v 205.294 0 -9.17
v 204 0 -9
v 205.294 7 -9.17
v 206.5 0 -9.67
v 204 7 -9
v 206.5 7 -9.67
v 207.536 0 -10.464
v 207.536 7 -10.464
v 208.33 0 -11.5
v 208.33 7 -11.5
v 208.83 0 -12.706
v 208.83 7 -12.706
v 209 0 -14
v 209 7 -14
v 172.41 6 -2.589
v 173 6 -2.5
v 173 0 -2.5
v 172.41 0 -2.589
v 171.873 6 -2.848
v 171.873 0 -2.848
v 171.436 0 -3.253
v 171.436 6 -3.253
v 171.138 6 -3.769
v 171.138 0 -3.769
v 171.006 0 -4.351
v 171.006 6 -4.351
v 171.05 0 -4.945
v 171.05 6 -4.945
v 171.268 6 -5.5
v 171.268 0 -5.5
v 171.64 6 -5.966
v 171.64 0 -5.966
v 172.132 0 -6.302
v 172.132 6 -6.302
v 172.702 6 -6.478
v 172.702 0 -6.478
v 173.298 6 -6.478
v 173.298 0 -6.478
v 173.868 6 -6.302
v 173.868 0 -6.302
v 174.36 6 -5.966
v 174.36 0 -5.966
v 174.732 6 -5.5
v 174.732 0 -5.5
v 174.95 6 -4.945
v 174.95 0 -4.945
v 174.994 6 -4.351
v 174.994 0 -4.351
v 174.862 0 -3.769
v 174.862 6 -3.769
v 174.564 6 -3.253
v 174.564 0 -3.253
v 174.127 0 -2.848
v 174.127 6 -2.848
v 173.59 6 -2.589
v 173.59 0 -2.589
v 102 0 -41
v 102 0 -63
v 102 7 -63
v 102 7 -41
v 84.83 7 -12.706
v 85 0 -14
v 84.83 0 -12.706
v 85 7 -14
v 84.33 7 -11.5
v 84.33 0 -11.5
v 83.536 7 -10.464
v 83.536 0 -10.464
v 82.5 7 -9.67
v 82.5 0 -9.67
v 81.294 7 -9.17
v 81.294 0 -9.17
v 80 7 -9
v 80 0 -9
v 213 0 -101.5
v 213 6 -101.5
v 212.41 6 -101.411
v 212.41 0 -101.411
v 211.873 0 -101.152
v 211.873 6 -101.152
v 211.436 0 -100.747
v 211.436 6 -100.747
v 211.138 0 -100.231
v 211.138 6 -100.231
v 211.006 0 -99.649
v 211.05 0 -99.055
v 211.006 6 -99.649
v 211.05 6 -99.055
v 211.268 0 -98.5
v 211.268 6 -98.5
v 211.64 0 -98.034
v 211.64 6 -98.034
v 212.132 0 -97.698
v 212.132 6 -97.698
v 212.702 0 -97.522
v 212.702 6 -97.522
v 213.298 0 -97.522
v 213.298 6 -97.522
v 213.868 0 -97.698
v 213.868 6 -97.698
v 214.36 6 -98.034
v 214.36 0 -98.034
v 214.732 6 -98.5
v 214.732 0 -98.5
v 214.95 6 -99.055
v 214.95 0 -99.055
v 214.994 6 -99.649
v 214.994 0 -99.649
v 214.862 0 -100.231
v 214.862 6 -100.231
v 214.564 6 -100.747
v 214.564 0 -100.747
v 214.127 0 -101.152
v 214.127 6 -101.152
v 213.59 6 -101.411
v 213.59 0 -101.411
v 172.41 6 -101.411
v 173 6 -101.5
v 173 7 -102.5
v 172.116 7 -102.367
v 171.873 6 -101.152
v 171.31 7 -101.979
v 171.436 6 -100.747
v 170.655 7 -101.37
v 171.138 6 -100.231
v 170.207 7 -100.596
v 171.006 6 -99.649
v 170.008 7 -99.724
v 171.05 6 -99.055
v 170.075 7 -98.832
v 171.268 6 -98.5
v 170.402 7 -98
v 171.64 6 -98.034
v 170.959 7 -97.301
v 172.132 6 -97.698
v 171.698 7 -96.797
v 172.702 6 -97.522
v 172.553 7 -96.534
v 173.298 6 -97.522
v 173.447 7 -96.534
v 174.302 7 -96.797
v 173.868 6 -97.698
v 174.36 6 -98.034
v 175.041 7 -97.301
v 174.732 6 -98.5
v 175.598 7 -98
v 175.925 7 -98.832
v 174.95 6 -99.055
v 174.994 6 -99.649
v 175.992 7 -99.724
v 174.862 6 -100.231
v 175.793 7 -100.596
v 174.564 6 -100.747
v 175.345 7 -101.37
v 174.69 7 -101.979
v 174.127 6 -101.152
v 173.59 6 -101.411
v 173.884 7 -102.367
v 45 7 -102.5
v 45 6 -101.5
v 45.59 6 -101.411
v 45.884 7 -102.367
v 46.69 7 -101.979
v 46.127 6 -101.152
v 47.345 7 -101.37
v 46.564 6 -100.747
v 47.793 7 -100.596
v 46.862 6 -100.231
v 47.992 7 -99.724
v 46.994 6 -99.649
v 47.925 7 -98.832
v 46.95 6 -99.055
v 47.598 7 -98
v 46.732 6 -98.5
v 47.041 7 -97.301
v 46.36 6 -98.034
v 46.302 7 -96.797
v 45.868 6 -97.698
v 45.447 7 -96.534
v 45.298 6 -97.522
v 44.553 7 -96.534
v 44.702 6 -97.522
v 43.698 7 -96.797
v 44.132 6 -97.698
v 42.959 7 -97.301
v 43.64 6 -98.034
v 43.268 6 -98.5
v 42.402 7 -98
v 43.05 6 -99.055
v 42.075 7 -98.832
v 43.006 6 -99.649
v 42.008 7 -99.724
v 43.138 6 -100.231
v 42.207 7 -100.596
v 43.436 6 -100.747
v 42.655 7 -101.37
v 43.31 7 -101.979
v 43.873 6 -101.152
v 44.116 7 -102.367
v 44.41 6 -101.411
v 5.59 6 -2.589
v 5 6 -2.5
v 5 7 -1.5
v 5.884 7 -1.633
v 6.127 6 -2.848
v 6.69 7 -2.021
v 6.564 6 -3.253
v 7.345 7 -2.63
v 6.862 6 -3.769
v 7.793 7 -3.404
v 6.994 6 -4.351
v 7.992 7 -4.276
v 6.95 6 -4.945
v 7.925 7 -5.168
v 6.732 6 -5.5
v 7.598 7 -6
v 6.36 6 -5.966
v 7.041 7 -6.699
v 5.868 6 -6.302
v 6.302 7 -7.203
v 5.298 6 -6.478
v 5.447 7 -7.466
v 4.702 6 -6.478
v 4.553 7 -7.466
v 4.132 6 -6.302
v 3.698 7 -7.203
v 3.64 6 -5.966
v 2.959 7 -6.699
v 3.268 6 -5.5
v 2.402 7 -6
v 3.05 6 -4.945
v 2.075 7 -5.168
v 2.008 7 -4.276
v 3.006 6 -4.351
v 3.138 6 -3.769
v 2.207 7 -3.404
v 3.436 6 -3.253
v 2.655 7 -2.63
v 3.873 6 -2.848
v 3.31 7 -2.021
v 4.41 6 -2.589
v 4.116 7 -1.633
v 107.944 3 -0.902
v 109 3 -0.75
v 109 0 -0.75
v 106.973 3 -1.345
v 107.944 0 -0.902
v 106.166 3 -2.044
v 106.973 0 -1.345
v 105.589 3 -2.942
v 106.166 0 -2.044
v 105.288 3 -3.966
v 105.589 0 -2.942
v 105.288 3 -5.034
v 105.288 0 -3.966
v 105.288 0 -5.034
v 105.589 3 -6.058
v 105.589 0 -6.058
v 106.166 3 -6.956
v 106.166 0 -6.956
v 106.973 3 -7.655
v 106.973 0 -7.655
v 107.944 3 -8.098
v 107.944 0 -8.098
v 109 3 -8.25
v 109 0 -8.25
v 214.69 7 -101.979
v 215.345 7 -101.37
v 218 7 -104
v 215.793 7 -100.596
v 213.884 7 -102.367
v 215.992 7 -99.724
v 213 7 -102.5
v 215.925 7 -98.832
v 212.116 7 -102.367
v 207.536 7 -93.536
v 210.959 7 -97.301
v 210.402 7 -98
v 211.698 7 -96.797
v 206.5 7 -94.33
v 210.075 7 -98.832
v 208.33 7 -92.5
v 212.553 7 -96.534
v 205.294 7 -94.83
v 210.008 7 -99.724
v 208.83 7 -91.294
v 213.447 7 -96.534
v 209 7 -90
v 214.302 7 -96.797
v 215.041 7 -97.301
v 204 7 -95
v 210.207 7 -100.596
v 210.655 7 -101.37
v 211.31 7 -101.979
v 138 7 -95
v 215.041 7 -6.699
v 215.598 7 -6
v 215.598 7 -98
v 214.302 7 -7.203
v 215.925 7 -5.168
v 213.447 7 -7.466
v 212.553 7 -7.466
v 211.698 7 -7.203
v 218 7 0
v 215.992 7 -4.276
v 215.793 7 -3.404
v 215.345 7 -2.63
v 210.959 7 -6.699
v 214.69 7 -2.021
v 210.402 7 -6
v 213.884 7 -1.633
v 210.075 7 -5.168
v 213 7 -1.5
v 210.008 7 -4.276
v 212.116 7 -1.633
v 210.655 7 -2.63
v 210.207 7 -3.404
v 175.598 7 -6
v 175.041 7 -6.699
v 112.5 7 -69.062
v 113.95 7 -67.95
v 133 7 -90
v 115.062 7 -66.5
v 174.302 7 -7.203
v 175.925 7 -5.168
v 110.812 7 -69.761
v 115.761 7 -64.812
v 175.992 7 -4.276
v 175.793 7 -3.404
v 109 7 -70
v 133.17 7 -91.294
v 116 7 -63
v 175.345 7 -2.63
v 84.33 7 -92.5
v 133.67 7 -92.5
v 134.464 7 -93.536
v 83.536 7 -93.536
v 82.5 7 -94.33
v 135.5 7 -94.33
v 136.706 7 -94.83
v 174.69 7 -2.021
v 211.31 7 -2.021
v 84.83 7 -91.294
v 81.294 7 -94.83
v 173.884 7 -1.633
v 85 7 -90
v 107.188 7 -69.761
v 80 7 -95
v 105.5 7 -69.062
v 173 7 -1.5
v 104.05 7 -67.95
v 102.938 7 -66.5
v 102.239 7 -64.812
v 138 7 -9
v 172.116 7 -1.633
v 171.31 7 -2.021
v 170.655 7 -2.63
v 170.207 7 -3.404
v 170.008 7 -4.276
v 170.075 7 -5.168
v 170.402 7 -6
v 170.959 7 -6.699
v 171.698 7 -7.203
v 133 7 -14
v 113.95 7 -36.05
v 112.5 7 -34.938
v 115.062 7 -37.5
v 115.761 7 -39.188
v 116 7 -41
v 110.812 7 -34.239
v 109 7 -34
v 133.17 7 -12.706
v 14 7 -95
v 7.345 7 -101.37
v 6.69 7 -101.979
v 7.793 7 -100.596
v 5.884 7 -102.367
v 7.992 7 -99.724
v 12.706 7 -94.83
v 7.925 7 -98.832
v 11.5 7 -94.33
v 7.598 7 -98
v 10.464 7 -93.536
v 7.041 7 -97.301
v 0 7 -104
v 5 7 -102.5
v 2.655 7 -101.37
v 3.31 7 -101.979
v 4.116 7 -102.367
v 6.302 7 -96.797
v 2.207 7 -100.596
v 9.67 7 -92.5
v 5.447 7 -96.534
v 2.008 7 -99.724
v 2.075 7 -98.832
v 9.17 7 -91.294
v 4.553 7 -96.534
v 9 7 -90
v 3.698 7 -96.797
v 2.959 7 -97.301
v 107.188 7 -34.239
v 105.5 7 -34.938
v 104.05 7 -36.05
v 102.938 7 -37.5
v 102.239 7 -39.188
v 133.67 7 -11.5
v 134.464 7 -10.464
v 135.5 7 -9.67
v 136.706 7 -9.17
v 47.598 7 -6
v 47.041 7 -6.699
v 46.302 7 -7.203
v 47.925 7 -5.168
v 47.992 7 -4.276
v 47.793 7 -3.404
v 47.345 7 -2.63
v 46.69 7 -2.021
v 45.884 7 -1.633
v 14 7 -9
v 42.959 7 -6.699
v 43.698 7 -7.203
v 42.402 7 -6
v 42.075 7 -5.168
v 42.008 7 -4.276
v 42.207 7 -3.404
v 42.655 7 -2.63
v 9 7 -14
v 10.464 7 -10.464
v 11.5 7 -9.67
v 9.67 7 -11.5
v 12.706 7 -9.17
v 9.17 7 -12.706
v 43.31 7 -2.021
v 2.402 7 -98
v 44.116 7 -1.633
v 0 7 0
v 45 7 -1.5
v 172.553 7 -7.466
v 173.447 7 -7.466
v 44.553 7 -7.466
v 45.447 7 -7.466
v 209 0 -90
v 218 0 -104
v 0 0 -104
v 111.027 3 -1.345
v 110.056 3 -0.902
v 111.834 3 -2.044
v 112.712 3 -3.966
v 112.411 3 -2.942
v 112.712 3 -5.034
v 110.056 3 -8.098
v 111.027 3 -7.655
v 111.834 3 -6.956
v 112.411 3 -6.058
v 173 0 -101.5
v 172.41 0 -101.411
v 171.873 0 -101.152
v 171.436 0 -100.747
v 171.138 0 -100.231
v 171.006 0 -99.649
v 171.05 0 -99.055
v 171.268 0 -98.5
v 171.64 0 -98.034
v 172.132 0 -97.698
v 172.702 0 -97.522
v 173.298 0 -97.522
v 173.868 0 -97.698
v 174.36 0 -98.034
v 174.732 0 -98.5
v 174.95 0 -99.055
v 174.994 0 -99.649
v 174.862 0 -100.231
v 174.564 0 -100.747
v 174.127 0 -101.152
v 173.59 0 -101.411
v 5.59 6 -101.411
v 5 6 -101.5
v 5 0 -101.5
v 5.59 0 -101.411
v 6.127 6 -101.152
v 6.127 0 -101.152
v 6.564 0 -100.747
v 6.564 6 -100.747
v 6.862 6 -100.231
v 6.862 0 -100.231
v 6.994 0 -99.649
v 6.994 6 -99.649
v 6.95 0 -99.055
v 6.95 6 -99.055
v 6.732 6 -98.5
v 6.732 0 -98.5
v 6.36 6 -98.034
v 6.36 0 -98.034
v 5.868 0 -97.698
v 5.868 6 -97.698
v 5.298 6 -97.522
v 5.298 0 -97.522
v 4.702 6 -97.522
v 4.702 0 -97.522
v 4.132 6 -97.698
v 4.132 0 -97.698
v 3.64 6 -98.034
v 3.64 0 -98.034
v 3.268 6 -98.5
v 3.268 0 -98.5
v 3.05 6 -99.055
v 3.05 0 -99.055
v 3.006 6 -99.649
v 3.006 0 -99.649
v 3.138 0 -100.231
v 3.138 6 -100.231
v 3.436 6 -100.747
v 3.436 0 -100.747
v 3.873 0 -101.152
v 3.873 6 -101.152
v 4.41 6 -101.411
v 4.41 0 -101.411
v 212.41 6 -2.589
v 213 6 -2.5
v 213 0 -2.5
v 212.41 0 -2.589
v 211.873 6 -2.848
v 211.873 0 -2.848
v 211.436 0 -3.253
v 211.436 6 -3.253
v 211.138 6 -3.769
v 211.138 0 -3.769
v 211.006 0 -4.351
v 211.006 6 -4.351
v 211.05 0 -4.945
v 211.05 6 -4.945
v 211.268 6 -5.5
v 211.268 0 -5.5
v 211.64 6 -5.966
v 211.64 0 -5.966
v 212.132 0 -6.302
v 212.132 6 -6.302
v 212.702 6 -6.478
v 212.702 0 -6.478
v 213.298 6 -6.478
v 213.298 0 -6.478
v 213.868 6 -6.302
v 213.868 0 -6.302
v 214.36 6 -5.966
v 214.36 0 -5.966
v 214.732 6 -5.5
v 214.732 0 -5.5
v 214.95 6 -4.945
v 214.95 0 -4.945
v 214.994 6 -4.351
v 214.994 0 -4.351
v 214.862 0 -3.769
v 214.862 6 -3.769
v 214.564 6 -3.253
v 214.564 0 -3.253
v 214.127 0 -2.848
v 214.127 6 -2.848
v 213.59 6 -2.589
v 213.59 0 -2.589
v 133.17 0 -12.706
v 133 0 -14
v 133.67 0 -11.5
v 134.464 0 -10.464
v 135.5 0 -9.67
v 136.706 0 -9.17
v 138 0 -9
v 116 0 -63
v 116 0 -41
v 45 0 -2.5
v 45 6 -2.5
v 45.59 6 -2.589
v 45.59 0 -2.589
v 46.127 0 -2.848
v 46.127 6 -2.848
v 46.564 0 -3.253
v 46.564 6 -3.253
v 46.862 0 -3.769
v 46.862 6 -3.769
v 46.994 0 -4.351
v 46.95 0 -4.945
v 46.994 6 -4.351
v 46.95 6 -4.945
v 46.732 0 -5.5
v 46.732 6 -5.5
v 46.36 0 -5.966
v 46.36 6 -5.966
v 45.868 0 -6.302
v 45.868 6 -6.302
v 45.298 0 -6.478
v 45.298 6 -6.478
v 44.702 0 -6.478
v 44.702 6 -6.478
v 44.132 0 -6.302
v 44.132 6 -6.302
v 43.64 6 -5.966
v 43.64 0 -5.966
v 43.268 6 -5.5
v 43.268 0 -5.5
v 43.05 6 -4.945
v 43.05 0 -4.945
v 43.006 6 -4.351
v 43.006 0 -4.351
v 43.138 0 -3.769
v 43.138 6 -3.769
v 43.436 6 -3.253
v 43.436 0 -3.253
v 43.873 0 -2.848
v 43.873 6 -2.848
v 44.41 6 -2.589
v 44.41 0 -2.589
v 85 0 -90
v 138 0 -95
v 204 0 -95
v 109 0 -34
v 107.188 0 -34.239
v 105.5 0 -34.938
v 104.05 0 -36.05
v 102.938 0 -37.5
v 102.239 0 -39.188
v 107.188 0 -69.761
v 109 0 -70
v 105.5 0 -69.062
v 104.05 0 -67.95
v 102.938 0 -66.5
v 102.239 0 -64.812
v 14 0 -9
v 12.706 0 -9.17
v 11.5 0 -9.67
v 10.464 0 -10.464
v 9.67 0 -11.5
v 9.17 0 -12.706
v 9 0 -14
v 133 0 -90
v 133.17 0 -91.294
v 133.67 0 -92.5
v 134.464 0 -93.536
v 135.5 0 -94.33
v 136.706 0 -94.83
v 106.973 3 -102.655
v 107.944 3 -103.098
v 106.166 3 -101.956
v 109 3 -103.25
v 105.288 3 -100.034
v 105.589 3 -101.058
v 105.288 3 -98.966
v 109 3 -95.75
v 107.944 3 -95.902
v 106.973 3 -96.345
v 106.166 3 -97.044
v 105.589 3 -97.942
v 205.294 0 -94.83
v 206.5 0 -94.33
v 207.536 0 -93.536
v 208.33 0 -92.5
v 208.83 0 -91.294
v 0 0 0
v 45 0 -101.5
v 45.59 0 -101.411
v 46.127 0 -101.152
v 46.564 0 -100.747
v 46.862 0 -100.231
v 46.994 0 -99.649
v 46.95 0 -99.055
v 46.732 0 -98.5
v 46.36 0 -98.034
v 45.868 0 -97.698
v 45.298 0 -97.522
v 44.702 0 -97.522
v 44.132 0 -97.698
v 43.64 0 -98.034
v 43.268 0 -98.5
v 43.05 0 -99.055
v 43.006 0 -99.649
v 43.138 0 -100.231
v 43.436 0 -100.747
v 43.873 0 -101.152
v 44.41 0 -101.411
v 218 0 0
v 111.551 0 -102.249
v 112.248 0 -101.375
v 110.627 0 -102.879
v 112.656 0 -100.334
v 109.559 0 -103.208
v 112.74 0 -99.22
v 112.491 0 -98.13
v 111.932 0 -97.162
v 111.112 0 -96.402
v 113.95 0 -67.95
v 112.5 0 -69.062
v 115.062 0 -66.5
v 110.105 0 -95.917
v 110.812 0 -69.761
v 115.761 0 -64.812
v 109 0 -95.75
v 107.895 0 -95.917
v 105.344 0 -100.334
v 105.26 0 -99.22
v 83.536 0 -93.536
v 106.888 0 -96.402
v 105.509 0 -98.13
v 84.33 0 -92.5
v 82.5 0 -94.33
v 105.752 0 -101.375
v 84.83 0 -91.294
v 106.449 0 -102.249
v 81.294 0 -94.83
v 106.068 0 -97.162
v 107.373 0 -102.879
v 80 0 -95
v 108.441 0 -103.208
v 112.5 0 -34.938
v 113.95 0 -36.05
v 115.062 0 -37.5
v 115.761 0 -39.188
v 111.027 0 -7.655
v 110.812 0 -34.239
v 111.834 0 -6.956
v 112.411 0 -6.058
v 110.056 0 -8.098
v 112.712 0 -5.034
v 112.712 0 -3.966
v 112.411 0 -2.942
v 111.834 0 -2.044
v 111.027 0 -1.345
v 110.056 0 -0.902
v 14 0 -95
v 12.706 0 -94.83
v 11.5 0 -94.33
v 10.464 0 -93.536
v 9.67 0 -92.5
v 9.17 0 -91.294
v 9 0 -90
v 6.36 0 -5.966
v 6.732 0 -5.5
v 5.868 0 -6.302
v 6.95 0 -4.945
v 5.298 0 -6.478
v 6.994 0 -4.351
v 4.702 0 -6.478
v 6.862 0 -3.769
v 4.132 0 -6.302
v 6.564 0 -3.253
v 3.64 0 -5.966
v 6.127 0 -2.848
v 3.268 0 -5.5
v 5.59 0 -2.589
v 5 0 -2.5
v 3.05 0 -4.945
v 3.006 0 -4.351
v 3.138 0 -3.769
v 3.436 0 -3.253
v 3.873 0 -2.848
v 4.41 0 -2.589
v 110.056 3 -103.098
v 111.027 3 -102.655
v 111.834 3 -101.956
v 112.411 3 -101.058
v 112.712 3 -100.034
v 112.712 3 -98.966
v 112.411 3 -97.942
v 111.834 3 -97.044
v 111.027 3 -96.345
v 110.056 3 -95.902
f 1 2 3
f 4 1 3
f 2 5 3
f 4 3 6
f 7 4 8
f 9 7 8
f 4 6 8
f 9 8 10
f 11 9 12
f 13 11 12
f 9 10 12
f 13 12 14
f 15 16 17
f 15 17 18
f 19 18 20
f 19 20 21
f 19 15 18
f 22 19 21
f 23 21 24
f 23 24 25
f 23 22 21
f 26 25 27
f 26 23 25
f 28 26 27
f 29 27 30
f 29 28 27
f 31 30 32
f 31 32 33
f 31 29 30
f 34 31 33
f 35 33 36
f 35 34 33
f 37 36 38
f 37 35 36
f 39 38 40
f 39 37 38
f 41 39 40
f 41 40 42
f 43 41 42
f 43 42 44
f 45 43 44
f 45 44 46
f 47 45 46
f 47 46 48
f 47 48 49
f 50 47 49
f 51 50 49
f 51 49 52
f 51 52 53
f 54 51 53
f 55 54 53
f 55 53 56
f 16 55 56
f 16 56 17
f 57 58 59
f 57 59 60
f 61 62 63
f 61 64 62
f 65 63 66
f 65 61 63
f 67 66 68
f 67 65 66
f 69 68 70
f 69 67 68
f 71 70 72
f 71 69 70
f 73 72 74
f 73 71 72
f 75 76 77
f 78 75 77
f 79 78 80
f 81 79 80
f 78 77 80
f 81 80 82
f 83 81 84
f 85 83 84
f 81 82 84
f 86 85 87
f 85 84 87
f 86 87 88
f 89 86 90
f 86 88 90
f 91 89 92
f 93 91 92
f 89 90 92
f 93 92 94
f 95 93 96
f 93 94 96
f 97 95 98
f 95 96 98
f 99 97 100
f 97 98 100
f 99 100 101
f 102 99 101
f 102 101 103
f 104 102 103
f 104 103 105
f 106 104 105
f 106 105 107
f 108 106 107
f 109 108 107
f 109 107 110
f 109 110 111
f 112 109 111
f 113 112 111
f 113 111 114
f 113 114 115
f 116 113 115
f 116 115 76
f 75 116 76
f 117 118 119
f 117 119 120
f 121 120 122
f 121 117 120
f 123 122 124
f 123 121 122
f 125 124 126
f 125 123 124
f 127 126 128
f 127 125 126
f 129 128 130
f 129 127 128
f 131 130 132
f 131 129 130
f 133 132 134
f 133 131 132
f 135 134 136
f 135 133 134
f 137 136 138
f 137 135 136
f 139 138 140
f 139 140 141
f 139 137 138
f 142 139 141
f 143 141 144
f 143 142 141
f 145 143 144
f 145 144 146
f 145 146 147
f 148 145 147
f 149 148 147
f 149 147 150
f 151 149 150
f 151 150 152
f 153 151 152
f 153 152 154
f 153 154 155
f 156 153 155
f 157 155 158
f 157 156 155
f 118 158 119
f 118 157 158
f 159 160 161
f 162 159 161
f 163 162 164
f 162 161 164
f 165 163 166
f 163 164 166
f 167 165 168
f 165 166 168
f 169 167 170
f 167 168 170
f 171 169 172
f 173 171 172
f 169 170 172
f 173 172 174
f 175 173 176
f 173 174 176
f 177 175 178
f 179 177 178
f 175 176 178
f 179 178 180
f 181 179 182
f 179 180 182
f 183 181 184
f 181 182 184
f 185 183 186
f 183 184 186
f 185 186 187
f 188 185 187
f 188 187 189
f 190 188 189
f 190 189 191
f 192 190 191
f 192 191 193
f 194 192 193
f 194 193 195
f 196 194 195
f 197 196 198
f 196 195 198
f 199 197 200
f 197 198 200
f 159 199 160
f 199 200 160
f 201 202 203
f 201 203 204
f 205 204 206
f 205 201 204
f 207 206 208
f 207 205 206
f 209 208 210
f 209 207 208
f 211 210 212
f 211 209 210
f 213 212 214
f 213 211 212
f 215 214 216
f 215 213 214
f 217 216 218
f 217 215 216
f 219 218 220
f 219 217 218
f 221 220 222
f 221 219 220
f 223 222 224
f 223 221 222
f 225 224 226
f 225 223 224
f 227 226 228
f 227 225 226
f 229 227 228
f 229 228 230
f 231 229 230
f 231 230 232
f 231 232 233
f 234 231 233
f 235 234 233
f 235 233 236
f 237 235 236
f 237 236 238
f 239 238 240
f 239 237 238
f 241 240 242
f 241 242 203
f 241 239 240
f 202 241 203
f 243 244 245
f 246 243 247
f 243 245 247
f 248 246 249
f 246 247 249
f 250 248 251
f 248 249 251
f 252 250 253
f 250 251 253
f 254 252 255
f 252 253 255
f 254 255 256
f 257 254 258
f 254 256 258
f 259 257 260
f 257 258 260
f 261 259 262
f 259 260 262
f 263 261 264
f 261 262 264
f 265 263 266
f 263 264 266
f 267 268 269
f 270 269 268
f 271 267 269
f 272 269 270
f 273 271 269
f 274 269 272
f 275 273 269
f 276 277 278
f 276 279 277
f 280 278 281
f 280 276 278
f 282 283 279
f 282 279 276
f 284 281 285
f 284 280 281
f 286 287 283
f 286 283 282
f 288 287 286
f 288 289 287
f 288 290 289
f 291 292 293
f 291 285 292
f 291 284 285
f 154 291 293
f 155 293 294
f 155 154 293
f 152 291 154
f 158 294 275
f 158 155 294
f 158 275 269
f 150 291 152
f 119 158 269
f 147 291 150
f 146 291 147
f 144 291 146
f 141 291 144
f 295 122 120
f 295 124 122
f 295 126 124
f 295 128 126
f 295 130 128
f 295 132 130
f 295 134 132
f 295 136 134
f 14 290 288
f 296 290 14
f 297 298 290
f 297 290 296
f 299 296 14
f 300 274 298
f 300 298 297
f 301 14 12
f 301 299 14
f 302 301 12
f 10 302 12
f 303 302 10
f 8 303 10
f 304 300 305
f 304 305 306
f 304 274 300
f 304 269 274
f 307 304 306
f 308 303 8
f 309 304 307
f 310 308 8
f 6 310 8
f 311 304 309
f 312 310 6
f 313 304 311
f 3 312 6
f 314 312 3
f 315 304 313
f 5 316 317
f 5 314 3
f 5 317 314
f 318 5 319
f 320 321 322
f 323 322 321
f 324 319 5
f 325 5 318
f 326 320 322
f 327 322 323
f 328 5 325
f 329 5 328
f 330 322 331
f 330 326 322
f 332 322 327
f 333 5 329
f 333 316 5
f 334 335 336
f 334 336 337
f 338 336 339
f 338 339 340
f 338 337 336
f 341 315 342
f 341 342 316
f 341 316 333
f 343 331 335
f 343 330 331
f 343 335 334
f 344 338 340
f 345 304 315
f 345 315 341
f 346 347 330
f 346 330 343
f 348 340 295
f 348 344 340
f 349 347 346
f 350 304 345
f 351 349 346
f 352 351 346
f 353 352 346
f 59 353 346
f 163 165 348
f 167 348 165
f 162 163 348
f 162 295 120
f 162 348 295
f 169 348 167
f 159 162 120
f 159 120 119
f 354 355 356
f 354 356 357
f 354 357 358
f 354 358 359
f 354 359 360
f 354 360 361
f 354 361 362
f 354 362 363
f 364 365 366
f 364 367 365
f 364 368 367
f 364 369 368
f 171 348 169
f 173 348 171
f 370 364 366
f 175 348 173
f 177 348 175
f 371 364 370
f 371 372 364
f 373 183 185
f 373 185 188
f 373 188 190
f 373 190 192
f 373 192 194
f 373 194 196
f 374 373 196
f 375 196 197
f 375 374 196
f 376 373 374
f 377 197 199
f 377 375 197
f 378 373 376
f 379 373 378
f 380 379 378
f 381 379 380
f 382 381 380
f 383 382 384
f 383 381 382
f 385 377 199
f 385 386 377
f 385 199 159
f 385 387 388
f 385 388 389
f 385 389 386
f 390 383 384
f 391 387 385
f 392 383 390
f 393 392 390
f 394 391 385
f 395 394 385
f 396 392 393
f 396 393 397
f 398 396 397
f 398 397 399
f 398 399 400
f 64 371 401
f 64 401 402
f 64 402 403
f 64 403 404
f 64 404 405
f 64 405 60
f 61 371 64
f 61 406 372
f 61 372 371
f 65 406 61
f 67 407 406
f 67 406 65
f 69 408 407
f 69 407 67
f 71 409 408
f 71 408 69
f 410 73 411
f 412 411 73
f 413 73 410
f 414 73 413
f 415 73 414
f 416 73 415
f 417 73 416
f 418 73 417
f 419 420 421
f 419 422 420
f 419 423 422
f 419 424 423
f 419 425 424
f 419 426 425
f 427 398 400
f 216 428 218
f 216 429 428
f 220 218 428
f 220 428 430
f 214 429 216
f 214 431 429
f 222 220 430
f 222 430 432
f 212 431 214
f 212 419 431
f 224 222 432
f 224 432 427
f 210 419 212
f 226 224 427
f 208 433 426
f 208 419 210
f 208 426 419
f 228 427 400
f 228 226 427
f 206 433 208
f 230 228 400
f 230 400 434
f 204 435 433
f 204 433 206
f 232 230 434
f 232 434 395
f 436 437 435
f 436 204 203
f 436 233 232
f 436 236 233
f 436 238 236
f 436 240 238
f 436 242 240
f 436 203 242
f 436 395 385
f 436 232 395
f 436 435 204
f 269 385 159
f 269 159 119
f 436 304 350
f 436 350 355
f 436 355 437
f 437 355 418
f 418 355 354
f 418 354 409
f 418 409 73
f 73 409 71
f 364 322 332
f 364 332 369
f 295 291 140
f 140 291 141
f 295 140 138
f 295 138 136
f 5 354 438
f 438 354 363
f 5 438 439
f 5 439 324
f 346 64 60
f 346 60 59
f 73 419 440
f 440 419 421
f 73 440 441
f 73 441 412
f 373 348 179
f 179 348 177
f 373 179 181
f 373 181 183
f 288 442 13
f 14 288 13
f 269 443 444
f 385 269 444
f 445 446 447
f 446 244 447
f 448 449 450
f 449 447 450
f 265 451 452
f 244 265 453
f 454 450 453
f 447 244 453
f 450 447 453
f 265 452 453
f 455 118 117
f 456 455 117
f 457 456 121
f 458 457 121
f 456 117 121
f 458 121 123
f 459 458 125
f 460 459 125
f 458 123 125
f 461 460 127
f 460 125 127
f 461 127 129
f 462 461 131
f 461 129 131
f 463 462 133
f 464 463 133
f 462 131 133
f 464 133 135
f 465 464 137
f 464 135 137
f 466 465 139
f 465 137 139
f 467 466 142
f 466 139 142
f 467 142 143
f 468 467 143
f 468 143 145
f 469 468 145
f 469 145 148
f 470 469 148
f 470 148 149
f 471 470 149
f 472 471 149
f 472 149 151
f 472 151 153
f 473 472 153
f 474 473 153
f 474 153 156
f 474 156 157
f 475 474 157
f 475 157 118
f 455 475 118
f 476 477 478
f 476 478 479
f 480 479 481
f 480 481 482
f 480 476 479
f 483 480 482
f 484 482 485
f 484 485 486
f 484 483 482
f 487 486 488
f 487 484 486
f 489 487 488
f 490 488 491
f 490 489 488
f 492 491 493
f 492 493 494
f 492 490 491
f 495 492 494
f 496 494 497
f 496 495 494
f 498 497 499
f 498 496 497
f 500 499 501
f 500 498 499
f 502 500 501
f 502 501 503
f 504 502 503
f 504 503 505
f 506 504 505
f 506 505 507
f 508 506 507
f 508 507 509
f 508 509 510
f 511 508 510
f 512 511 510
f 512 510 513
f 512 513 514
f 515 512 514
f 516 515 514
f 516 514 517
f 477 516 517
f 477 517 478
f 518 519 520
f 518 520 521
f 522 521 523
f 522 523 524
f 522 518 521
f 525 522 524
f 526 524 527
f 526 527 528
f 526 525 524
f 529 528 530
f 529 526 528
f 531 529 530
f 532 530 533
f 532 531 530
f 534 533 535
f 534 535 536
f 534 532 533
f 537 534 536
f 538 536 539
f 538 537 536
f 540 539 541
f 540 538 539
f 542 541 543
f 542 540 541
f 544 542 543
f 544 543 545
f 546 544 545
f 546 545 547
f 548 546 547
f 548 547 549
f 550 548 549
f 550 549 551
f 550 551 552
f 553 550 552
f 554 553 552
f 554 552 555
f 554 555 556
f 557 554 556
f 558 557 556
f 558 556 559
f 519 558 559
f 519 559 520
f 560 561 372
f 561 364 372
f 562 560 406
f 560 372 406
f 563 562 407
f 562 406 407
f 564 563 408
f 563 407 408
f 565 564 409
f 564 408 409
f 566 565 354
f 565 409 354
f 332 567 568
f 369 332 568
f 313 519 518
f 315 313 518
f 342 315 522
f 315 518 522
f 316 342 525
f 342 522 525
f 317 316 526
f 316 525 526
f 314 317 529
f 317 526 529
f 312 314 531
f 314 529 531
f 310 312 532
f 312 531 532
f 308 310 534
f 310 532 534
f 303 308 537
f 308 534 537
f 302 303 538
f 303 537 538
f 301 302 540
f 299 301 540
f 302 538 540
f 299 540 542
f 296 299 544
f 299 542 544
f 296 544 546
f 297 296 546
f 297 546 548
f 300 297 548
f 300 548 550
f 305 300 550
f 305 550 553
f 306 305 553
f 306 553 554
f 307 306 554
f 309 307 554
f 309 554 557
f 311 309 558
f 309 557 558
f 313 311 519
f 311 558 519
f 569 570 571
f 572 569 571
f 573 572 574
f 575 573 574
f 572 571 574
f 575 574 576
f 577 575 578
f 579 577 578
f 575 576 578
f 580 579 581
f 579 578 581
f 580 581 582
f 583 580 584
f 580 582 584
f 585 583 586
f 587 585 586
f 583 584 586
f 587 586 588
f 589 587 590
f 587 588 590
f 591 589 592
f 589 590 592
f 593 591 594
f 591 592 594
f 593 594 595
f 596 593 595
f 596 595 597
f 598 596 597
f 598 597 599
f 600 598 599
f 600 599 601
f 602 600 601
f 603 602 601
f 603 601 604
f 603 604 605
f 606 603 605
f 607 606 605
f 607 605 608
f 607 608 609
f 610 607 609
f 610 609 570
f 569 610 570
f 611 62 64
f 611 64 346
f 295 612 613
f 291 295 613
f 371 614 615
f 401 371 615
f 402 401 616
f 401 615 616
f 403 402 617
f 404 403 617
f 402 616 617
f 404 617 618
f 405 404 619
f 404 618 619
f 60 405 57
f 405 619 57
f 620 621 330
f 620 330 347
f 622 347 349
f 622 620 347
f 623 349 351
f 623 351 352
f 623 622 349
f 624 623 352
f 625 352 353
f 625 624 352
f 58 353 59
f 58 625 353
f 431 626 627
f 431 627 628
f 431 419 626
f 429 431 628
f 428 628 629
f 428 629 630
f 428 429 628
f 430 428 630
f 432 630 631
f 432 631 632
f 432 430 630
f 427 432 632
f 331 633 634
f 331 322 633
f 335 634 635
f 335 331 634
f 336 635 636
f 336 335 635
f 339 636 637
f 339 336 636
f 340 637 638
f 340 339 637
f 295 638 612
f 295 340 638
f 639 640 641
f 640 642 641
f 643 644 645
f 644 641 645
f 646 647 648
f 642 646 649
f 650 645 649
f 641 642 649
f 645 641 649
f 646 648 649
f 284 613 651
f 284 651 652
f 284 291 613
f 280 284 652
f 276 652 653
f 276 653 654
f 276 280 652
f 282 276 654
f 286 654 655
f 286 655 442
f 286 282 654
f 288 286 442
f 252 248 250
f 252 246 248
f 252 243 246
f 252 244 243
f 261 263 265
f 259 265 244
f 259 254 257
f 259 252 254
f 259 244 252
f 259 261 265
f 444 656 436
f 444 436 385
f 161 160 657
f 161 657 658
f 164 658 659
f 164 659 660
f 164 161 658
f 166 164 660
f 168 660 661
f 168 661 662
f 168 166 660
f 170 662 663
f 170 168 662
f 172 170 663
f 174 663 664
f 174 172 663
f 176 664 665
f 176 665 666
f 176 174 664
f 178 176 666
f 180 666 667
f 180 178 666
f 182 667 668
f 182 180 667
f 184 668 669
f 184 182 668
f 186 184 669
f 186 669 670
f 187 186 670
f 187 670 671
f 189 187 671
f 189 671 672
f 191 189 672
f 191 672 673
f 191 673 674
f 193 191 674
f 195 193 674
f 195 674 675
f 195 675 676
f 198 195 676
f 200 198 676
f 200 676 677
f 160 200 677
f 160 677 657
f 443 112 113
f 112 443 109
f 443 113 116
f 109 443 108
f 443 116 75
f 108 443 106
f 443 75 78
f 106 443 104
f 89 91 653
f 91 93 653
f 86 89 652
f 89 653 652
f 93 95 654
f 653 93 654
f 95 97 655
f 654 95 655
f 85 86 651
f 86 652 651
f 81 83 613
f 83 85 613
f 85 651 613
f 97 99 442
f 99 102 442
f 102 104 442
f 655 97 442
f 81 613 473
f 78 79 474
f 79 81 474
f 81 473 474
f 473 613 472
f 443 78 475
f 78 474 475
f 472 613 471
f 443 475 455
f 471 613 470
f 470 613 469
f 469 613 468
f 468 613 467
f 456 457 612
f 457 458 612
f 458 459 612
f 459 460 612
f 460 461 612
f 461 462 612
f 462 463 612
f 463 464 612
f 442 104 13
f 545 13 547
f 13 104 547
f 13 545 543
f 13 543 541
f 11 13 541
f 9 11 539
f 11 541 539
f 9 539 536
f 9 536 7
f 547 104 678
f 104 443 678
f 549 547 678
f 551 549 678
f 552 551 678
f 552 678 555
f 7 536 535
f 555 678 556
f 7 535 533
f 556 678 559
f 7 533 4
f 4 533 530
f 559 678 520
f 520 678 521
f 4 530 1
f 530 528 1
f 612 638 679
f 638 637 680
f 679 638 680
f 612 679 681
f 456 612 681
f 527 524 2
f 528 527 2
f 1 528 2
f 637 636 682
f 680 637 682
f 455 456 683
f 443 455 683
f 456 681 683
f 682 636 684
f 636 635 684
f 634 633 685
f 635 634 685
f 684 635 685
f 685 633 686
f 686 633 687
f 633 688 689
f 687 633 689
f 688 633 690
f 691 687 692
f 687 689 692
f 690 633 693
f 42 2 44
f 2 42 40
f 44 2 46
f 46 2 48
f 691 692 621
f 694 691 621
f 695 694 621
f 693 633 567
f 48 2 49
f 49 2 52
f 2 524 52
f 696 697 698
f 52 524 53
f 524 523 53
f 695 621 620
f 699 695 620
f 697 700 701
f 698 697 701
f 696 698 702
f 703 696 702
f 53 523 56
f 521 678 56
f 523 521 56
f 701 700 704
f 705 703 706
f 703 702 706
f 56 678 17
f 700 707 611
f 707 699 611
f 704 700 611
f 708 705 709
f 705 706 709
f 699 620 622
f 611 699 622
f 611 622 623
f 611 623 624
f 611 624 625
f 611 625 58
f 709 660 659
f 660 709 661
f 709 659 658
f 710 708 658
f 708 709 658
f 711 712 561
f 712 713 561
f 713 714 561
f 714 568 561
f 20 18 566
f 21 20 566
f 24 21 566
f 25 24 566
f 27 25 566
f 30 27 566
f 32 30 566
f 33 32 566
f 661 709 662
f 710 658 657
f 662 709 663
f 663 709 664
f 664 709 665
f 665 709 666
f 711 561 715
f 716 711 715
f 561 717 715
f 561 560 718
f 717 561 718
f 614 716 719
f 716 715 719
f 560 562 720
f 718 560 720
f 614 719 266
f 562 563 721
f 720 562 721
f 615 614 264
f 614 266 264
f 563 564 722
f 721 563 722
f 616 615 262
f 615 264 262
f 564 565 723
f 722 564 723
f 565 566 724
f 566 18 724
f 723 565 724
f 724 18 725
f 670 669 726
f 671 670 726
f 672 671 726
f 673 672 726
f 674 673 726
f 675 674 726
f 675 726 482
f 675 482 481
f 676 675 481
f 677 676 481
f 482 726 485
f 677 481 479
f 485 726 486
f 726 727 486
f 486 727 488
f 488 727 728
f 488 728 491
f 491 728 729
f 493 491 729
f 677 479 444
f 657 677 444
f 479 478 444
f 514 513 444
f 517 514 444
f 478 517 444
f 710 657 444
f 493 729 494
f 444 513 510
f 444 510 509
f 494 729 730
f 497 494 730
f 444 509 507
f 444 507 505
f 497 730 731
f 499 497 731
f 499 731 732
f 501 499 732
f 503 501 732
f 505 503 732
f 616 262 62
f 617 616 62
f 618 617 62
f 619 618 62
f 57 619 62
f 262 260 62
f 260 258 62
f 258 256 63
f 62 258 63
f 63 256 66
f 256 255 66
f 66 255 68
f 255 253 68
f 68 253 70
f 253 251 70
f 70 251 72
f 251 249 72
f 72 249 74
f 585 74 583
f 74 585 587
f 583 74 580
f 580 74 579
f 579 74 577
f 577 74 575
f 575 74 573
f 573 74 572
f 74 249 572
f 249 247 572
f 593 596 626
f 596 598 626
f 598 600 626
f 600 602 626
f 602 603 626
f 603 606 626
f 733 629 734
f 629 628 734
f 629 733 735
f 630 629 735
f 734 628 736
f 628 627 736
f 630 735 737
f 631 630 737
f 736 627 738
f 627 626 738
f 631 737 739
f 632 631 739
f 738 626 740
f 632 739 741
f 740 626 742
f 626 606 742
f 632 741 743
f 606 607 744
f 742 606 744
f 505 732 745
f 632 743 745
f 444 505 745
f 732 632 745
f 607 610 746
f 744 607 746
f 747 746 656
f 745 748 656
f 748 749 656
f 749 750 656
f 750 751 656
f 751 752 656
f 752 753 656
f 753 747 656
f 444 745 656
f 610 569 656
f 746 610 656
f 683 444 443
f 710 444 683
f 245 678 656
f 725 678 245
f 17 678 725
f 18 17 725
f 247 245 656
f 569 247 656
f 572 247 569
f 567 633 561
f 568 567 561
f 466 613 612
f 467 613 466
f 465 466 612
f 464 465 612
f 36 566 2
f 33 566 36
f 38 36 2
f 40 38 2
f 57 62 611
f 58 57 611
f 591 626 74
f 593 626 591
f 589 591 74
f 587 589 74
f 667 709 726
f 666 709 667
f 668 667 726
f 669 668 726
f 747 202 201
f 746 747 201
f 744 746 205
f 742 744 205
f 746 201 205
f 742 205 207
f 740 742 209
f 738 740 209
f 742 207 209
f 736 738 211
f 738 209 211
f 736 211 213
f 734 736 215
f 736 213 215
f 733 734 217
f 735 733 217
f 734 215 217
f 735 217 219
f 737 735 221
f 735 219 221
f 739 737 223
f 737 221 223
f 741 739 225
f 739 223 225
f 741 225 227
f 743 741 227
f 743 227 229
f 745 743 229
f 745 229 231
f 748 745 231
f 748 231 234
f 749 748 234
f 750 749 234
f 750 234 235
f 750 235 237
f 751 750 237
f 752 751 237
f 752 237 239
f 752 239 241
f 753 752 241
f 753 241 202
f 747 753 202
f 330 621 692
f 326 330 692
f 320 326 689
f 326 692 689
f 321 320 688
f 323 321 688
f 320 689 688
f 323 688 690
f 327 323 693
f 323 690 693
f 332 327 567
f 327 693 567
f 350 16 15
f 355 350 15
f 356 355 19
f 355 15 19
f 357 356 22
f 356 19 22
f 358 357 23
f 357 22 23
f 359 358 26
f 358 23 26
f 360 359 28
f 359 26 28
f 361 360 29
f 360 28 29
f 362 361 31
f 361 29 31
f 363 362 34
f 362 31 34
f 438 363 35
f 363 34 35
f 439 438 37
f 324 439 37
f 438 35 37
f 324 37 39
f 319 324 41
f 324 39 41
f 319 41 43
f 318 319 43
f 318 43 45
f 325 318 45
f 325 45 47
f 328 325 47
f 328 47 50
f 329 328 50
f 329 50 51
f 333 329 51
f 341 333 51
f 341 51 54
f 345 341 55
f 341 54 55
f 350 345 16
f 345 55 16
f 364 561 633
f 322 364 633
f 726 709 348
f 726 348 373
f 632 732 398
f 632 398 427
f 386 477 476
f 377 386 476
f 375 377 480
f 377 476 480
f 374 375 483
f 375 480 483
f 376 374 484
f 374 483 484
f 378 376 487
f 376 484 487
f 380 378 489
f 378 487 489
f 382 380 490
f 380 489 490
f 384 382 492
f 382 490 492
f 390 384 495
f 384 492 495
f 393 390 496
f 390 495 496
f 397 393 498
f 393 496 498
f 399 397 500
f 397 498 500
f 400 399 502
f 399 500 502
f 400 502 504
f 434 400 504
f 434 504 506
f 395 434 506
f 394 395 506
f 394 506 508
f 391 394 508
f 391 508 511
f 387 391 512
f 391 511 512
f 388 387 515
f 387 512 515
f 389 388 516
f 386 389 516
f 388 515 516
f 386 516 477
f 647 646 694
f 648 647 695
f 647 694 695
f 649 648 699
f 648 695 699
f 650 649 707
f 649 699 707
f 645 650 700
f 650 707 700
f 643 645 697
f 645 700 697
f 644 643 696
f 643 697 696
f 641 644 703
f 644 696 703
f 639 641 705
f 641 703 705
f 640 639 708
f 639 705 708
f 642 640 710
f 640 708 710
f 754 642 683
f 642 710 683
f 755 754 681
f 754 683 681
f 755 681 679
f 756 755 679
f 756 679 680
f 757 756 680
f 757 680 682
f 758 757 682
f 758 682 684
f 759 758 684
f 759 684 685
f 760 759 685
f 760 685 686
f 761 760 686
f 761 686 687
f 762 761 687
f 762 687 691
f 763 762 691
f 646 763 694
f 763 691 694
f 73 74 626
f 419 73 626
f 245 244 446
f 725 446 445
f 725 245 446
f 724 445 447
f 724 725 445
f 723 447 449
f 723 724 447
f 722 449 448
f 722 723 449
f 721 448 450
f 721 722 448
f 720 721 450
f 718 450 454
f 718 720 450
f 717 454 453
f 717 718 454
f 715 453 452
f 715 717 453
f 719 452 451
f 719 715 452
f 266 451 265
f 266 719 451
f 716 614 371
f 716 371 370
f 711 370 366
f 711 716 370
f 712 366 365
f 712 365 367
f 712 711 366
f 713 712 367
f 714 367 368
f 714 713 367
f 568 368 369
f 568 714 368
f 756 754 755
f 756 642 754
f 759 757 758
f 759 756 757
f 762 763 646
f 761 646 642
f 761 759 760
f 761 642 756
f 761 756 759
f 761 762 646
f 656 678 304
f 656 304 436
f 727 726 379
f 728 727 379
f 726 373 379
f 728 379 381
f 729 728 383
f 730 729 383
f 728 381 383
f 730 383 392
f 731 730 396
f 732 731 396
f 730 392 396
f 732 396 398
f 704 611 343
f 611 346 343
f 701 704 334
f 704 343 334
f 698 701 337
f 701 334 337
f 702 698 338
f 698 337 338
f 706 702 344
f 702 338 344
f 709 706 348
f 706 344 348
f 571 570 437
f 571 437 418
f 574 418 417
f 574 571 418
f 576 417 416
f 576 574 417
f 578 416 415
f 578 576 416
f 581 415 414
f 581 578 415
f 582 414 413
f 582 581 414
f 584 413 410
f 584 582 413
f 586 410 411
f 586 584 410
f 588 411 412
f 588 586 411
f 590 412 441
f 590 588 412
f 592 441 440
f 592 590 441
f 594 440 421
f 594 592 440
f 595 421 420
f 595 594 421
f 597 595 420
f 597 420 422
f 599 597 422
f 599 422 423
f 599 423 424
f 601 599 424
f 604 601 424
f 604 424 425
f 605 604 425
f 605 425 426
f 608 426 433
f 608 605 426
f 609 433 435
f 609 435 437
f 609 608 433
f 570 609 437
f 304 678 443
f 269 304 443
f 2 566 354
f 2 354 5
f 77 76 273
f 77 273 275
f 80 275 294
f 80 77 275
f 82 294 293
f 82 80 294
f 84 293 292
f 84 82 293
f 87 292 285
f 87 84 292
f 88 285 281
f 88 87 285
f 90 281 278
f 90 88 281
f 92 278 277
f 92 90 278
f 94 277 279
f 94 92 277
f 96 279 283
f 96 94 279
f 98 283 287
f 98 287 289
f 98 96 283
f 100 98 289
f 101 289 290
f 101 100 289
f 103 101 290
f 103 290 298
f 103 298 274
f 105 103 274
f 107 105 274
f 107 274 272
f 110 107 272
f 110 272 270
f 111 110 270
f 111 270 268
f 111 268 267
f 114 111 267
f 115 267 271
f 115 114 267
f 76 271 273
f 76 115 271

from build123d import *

# Parameters (mm, degrees)
BOSS_EXTRUDE1_DEPTH = 7
FILLET1_R           = 5
SKETCH2_R           = 2
CUT_EXTRUDE1_DEPTH  = 121.971070922
SKETCH3_R           = 3.75
CUT_EXTRUDE2_DEPTH  = 3
CHAMFER1_SIZE       = 1


with BuildPart() as part:
    # Sketch1 → Boss-Extrude1 (new body)
    with BuildSketch(Plane(origin=(0, 0, 0), x_dir=(1, 0, 0), z_dir=(0, 1, 0))):
        with BuildLine():
            Line((0, 0), (109, 0))
            Line((109, 0), (109, 34))
            ThreePointArc((109, 34), (104.050252532, 36.050252532), (102, 41))
            Line((102, 41), (102, 52))
            Line((102, 52), (85, 52))
            Line((85, 52), (85, 9))
            Line((85, 9), (9, 9))
            Line((9, 9), (9, 52))
            Line((9, 52), (0, 52))
            Line((0, 52), (0, 0))
        make_face()
    extrude(amount=BOSS_EXTRUDE1_DEPTH)

    # Fillet1
    fillet1_edges = [part.edges().sort_by_distance(p)[0] for p in [
        (9, 3.5, -9),
        (85, 3.5, -9),
    ]]
    fillet(fillet1_edges, radius=FILLET1_R)

    # Sketch2 → Cut-Extrude1 (cut, through all)
    with BuildSketch(Plane(origin=(0, 7, 0), x_dir=(1, 0, 0), z_dir=(0, 1, 0))):
        with Locations(Location((5, 4.5, 0), (0, 0, 270))):
            Circle(SKETCH2_R)
        with Locations(Location((45, 4.5, 0), (0, 0, 270))):
            Circle(SKETCH2_R)
    extrude(amount=-CUT_EXTRUDE1_DEPTH, mode=Mode.SUBTRACT)

    # Sketch3 → Cut-Extrude2 (cut)
    with BuildSketch(Plane(origin=(0, 0, 0), x_dir=(-1, 0, 0), z_dir=(0, -1, 0))):
        with Locations((-109, 4.5)):
            Circle(SKETCH3_R)
    extrude(amount=-CUT_EXTRUDE2_DEPTH, mode=Mode.SUBTRACT)

    # Chamfer1
    chamfer1_edges = [part.edges().sort_by_distance(p)[0] for p in [
        (5, 7, -6.5),
        (45, 7, -6.5),
    ]]
    chamfer(chamfer1_edges, length=CHAMFER1_SIZE)

    # Mirror1: part across plane


with BuildPart() as part_1:
    add(part.part)
    add(part.part.mirror(Plane(origin=(9, 7, -52), x_dir=(1, 0, 0), z_dir=(0, 0, 1))))

    # Mirror2: part across plane


with BuildPart() as part_2:
    add(part_1.part)
    add(part_1.part.mirror(Plane(origin=(109, 7, -104), x_dir=(0, 0, 1), z_dir=(-1, 0, 0))))


solid = part_2.part
